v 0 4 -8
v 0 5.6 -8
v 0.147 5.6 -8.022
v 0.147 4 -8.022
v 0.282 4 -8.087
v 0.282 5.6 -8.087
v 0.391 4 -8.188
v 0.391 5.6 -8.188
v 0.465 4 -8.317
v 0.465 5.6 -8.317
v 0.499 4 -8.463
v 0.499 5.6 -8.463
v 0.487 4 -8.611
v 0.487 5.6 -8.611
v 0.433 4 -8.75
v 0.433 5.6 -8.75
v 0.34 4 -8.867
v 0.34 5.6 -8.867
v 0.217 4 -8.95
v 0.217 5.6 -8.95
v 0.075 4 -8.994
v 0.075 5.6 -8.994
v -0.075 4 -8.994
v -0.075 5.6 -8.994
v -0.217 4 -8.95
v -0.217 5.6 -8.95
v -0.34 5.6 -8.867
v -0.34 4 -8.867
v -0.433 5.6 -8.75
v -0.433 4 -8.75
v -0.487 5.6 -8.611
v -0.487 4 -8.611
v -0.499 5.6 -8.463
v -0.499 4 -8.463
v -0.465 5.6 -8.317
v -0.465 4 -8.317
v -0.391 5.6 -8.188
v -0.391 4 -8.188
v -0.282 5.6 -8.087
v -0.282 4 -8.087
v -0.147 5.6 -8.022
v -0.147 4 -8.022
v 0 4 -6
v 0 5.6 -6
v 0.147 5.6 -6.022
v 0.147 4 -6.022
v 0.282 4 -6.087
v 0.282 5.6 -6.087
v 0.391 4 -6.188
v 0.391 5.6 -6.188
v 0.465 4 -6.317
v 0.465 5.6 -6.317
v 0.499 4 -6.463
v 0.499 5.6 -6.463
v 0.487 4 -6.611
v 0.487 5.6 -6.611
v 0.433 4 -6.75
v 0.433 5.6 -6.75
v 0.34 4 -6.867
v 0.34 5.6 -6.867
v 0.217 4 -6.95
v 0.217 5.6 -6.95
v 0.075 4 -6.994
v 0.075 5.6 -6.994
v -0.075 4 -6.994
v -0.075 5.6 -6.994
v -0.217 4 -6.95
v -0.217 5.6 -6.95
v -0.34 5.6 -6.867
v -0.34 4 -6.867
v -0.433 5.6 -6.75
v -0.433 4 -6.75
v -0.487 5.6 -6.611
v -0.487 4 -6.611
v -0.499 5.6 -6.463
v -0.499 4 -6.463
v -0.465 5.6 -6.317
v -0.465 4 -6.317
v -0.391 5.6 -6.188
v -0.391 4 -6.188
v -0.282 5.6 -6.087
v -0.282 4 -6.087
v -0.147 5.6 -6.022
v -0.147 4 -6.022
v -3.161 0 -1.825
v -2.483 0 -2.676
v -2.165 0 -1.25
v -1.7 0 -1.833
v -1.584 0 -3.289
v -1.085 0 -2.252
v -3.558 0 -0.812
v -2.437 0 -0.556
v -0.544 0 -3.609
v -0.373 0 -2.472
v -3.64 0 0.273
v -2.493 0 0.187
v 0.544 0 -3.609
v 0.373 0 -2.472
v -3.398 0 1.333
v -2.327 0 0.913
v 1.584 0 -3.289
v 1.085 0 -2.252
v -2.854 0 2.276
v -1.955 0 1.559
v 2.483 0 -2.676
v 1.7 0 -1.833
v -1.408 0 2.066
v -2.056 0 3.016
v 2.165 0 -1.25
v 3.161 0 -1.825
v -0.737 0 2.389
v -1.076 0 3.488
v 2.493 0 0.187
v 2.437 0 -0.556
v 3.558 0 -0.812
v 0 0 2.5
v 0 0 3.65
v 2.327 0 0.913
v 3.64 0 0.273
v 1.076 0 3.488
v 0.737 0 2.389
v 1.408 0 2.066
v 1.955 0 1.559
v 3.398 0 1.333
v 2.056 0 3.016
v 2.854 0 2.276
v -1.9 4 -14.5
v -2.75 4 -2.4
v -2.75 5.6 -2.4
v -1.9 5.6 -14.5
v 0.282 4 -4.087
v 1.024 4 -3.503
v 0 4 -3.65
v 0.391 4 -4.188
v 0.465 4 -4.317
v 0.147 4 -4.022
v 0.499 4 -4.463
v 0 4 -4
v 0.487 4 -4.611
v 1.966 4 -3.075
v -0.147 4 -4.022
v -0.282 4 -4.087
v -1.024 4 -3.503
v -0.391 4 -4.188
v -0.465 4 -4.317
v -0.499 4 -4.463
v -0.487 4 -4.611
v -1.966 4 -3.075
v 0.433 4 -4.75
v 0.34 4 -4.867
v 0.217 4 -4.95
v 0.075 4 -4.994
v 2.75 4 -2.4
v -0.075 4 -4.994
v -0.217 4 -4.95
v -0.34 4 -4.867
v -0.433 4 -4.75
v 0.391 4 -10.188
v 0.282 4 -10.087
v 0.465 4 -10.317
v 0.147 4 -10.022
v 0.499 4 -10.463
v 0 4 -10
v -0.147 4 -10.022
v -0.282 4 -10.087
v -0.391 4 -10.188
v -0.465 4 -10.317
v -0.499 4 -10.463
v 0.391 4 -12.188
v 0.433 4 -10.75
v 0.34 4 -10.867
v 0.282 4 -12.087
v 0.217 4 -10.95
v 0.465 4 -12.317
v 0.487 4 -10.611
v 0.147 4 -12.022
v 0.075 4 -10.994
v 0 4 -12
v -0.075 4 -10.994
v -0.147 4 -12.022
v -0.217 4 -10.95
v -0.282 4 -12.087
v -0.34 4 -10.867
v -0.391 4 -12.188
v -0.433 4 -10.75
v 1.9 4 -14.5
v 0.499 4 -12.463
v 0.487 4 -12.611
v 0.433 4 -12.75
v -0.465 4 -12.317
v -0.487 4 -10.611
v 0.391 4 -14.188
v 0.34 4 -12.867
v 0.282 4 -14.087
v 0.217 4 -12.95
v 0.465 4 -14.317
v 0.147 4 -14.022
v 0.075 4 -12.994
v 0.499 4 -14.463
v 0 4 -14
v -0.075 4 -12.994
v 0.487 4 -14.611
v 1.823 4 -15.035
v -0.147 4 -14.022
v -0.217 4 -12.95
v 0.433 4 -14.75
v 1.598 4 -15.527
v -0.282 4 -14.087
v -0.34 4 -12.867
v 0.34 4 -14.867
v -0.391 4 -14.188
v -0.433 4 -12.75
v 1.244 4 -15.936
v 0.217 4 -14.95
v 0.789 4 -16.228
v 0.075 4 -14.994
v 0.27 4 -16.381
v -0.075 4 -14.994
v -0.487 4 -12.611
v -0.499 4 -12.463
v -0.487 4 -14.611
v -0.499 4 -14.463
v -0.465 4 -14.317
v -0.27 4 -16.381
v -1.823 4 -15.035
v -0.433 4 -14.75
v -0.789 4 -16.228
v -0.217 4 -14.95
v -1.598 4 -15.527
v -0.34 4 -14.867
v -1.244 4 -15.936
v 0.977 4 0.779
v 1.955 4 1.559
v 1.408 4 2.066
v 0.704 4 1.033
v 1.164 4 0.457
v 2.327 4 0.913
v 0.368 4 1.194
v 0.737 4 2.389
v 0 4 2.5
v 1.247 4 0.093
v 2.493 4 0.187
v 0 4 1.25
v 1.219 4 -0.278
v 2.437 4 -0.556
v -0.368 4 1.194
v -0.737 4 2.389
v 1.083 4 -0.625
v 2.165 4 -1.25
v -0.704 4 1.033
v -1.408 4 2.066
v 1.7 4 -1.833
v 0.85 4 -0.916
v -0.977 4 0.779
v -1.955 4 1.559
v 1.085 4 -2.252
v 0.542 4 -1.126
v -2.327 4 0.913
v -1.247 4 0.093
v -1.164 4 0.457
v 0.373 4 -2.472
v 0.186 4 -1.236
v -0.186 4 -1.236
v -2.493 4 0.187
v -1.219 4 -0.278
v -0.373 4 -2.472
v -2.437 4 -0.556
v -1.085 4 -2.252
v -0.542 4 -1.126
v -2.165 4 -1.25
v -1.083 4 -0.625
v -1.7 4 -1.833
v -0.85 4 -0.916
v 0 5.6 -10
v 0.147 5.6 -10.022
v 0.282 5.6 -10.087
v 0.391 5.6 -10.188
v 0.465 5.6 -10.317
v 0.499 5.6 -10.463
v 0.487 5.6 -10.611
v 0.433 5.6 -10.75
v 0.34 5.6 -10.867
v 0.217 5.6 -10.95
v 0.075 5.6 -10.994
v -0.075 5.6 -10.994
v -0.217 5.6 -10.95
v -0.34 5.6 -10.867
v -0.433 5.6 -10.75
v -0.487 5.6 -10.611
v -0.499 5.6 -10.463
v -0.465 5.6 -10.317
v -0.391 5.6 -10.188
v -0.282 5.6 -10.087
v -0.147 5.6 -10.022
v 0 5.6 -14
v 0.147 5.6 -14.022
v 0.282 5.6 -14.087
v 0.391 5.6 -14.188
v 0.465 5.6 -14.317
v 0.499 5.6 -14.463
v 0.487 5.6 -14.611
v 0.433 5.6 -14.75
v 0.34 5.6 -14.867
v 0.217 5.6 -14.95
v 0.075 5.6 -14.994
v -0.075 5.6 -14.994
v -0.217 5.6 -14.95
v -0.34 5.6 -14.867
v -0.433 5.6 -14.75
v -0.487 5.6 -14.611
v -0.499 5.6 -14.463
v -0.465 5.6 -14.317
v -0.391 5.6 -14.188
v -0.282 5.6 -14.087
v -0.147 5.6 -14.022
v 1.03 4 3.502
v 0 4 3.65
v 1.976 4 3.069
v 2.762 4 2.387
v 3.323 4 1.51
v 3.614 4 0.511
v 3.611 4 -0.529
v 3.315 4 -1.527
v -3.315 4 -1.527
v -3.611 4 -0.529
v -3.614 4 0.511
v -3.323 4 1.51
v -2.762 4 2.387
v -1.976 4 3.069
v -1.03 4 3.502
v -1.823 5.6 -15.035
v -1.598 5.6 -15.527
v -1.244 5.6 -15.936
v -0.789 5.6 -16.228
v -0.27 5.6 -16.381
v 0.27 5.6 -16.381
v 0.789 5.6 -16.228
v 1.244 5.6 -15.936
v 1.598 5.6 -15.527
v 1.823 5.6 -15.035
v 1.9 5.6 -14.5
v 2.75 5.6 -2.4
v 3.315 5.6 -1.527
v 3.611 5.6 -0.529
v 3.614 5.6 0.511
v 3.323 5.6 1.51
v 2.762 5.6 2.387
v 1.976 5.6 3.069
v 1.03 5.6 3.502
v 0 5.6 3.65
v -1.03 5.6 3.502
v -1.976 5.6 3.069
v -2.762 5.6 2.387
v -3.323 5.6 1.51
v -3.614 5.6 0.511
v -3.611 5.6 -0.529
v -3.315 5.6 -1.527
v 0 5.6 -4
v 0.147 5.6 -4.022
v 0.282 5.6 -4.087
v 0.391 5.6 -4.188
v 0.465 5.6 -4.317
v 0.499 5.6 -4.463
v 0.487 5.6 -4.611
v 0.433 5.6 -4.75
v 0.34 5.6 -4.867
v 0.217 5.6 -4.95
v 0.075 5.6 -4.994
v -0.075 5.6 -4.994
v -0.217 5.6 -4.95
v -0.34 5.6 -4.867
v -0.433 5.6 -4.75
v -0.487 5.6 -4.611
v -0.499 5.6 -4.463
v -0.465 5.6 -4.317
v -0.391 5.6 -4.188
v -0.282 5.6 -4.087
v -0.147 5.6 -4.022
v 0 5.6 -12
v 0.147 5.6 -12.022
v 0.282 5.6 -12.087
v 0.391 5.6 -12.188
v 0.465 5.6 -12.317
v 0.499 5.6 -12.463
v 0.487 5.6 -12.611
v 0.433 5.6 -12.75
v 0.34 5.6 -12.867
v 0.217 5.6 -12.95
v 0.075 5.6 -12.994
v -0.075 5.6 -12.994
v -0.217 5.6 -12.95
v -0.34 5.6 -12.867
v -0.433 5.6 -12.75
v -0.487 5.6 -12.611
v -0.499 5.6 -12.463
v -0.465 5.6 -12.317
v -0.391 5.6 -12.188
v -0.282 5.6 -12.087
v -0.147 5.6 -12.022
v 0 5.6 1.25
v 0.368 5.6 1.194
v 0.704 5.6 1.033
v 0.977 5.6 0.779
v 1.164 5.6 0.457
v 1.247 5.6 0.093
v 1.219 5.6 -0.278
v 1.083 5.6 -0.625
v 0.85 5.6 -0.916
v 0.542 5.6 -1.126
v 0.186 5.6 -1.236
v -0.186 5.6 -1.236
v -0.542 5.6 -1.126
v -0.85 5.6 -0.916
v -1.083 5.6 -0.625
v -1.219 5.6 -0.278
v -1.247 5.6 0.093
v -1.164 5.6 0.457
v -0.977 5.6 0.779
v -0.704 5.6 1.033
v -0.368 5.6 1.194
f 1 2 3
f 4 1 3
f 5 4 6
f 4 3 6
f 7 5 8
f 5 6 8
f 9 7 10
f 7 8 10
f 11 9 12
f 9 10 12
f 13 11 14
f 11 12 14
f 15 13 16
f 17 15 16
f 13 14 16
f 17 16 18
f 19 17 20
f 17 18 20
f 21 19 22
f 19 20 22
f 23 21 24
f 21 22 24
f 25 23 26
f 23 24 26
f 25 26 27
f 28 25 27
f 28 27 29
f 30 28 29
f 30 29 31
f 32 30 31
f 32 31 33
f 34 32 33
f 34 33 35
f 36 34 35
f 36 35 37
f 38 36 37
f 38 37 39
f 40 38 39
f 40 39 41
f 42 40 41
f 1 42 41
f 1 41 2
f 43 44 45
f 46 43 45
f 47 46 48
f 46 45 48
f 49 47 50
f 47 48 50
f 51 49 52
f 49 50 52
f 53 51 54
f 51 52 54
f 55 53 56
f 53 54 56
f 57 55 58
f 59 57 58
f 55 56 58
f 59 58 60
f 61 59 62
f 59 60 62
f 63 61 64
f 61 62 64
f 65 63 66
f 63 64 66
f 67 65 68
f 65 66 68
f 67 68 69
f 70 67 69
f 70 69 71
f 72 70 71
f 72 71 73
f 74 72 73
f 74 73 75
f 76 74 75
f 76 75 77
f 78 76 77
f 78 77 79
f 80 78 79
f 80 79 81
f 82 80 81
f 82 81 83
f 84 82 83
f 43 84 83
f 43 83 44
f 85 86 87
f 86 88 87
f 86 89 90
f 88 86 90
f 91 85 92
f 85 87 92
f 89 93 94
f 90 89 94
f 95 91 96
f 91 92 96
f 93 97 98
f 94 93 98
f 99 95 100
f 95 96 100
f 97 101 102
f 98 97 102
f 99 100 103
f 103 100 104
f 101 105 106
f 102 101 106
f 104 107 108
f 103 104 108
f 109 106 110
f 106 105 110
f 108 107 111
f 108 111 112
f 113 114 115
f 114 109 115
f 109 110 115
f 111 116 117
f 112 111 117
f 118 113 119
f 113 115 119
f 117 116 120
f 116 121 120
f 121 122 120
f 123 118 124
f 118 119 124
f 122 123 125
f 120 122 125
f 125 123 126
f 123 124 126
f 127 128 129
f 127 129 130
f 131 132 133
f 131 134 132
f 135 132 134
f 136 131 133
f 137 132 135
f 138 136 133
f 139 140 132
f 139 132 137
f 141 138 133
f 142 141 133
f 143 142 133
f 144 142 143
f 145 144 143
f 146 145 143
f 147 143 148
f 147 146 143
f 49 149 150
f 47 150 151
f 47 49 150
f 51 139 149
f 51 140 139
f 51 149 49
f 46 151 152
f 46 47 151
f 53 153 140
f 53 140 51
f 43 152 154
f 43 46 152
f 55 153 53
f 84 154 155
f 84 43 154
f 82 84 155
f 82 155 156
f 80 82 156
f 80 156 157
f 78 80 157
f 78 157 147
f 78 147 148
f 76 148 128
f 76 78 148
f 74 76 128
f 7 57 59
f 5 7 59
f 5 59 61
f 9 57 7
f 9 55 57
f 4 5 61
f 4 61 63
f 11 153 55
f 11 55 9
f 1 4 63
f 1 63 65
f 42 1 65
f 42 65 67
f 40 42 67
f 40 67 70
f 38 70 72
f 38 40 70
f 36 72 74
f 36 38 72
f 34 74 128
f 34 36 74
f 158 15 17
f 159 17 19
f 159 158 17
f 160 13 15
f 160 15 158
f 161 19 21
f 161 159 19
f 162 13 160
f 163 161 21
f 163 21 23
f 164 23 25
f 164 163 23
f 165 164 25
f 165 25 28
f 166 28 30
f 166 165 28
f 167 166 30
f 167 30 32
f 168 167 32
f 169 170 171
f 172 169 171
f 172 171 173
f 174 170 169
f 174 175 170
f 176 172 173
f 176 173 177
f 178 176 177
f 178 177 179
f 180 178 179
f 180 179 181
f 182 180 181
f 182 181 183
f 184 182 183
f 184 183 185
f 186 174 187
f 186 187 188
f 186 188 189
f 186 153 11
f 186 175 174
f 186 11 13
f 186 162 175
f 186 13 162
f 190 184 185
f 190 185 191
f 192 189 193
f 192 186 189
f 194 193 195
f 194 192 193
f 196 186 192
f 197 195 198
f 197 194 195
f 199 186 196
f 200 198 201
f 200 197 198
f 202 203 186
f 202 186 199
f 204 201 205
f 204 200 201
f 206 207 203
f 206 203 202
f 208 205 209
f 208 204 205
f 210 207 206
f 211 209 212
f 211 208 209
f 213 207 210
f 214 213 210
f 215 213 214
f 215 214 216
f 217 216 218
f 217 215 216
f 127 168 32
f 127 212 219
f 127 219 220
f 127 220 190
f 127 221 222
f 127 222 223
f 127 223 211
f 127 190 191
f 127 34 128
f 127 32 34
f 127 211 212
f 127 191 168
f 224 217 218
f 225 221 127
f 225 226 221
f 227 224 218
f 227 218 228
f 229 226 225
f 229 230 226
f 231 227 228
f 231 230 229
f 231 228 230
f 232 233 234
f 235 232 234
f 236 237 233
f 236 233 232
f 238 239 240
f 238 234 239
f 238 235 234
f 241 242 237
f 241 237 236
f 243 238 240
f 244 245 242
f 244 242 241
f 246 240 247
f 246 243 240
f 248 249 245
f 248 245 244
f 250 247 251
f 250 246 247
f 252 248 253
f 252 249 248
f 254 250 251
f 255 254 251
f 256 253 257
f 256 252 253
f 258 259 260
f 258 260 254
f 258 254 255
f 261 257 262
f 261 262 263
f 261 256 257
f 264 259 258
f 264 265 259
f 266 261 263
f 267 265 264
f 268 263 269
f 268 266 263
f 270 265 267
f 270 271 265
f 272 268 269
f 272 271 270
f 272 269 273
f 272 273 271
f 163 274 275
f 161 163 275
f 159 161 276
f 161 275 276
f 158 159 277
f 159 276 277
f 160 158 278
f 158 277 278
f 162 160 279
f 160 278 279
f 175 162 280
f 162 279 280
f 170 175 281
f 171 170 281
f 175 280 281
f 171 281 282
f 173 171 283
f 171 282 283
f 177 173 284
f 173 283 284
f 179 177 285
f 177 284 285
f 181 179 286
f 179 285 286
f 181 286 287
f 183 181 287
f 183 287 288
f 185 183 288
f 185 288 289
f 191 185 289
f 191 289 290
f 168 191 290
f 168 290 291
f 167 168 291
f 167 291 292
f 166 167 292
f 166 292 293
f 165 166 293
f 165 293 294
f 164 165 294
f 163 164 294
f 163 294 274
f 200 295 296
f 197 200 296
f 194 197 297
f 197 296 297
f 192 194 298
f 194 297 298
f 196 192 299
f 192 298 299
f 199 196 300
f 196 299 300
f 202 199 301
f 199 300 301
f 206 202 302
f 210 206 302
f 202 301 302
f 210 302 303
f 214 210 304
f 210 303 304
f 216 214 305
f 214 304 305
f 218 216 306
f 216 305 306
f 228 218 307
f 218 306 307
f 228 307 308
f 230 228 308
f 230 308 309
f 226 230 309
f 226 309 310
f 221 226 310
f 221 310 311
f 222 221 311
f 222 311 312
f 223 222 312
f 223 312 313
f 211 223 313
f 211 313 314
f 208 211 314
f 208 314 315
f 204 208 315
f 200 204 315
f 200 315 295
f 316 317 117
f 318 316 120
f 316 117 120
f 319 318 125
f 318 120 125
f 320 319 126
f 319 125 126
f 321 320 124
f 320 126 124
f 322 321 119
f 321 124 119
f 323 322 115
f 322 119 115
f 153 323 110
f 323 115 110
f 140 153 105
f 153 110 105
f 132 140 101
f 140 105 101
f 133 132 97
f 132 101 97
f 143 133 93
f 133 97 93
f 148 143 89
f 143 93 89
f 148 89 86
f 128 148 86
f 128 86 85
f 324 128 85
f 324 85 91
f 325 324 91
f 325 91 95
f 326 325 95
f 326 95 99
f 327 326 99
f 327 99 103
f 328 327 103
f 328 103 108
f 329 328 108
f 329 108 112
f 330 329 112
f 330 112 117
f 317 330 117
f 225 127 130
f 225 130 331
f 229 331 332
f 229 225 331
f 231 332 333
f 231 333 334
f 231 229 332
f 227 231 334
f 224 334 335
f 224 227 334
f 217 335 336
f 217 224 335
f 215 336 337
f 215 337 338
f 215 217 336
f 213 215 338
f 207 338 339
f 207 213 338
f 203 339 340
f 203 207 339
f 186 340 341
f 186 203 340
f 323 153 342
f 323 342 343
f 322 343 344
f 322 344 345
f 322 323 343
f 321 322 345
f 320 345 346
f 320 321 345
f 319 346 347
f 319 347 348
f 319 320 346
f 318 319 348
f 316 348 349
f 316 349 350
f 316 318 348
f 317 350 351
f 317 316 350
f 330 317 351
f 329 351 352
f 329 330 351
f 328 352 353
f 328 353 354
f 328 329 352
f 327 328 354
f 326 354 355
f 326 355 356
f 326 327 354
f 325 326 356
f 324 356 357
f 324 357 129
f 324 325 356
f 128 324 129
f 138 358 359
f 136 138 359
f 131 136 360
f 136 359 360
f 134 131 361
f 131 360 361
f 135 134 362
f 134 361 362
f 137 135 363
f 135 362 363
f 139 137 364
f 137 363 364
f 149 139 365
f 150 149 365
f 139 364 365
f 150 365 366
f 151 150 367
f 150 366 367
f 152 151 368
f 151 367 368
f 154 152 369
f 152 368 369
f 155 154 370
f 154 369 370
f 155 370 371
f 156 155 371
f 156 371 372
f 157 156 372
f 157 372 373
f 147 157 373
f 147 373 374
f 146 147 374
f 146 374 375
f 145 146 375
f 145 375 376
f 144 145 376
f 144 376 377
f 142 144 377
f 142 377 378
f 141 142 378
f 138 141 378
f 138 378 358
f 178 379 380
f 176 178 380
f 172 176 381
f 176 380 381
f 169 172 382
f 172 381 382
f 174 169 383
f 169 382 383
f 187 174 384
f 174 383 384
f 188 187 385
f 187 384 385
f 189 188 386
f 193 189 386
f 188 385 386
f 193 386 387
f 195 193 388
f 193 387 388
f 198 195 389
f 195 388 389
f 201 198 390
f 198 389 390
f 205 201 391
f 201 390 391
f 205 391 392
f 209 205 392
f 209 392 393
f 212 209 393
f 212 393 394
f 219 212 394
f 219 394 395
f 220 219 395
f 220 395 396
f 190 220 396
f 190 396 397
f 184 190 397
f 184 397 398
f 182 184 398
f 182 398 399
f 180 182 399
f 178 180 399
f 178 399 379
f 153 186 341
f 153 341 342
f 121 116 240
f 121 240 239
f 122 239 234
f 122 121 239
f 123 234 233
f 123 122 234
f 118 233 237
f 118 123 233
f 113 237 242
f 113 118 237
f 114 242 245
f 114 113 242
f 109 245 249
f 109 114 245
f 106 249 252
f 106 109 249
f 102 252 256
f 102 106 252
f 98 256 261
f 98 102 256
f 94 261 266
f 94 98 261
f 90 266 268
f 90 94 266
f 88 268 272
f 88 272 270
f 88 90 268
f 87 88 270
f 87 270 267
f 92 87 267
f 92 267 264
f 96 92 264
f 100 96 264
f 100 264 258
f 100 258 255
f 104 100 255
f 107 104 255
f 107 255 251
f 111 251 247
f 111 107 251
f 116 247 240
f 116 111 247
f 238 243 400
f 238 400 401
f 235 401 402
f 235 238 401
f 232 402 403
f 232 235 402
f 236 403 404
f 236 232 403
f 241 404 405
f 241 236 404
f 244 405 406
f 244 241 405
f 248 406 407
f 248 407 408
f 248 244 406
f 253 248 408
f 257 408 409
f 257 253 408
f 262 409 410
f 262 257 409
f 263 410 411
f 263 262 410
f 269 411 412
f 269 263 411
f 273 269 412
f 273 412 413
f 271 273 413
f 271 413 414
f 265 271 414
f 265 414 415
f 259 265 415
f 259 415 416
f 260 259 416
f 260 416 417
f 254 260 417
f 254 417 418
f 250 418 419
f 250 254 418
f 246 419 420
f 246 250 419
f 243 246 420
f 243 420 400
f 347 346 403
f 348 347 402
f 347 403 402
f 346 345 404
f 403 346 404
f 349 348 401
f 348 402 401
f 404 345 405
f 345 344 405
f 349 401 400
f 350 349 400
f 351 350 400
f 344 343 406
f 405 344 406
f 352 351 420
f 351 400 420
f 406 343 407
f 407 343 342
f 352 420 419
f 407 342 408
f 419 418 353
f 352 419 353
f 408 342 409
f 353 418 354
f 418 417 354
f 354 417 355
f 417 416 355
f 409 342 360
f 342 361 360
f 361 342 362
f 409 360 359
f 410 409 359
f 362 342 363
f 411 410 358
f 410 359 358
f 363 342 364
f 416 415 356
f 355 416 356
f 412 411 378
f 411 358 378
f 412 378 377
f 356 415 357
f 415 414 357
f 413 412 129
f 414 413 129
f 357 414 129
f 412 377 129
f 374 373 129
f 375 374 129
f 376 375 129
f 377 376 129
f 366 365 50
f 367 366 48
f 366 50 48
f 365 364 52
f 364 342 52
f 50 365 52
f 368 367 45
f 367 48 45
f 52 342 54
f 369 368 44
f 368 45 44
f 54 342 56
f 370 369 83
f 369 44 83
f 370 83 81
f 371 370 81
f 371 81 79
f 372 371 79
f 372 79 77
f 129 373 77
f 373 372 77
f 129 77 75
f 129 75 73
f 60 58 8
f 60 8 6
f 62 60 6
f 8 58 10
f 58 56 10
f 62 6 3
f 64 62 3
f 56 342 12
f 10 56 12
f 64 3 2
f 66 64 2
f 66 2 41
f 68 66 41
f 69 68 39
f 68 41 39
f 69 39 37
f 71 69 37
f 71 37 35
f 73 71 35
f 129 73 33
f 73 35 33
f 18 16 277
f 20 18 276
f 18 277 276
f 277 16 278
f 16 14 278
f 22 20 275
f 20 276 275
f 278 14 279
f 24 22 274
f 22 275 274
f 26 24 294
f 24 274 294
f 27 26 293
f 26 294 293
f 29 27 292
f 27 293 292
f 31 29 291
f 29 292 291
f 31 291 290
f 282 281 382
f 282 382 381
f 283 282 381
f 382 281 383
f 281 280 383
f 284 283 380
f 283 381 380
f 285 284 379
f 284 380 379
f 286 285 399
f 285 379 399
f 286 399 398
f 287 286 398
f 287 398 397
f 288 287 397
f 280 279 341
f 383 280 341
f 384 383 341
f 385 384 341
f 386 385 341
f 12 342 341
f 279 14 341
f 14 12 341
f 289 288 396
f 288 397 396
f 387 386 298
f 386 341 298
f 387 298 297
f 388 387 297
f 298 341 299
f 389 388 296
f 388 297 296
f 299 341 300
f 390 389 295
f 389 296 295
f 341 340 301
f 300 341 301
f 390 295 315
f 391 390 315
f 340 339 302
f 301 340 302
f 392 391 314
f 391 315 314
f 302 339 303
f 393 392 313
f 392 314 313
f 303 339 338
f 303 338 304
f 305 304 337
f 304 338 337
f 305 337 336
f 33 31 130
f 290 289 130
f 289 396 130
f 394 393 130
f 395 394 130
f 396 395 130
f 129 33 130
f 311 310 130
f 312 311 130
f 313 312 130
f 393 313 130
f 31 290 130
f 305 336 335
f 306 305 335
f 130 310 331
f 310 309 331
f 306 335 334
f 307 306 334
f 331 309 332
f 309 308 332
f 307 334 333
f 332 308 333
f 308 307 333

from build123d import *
from build123d.topology import SkipClean

# Parameters (mm, degrees)
SKETCH1_R           = 3.65
SKETCH1_R_2         = 2.5
BOSS_EXTRUDE1_DEPTH = 4
SKETCH2_R           = 1.25
BOSS_EXTRUDE2_DEPTH = 1.6
CUT_EXTRUDE1_REACH  = 19.71
SKETCH3_R           = 0.5


with BuildPart() as part:
    # Sketch1 → Boss-Extrude1 (new body)
    with BuildSketch(Plane(origin=(0, 0, 0), x_dir=(1, 0, 0), z_dir=(0, 1, 0))):
        Circle(SKETCH1_R)
        Circle(SKETCH1_R_2, mode=Mode.SUBTRACT)
    extrude(amount=BOSS_EXTRUDE1_DEPTH)

    # Sketch2 → Boss-Extrude2 (add)
    with SkipClean():  # the faces are left unmerged after this step: merging them gives an invalid solid
        with BuildSketch(Plane(origin=(0, 4, 0), x_dir=(1, 0, 0), z_dir=(0, 1, 0))):
            with BuildLine():
                Line((-2.75, 2.4), (-1.9, 14.5))
                ThreePointArc((-1.9, 14.5), (0, 16.4), (1.9, 14.5))
                Line((1.9, 14.5), (2.75, 2.4))
                ThreePointArc((2.75, 2.4), (0, -3.65), (-2.75, 2.4))
            make_face()
            Circle(SKETCH2_R, mode=Mode.SUBTRACT)
        extrude(amount=BOSS_EXTRUDE2_DEPTH)
    add(part.part.scale(1), mode=Mode.REPLACE)  # the faces are merged on a copy

    # Sketch3 → Cut-Extrude1 (cut, up to next)
    with BuildSketch(Plane(origin=(0, 5.6, 0), x_dir=(1, 0, 0), z_dir=(0, 1, 0)), mode=Mode.PRIVATE) as cut_extrude1_sk1:
        with Locations((0, 12.5)):
            Circle(SKETCH3_R)
    cut_extrude1_tool1 = extrude(cut_extrude1_sk1.sketch, amount=-CUT_EXTRUDE1_REACH, mode=Mode.PRIVATE) & part.part
    # Sketch3 → Cut-Extrude1 (cut, up to next)
    with BuildSketch(Plane(origin=(0, 5.6, 0), x_dir=(1, 0, 0), z_dir=(0, 1, 0)), mode=Mode.PRIVATE) as cut_extrude1_sk2:
        with Locations((0, 10.5)):
            Circle(SKETCH3_R)
    cut_extrude1_tool2 = extrude(cut_extrude1_sk2.sketch, amount=-CUT_EXTRUDE1_REACH, mode=Mode.PRIVATE) & part.part
    # Sketch3 → Cut-Extrude1 (cut, up to next)
    with BuildSketch(Plane(origin=(0, 5.6, 0), x_dir=(1, 0, 0), z_dir=(0, 1, 0)), mode=Mode.PRIVATE) as cut_extrude1_sk3:
        with Locations((0, 14.5)):
            Circle(SKETCH3_R)
    cut_extrude1_tool3 = extrude(cut_extrude1_sk3.sketch, amount=-CUT_EXTRUDE1_REACH, mode=Mode.PRIVATE) & part.part
    # Sketch3 → Cut-Extrude1 (cut, up to next)
    with BuildSketch(Plane(origin=(0, 5.6, 0), x_dir=(1, 0, 0), z_dir=(0, 1, 0)), mode=Mode.PRIVATE) as cut_extrude1_sk4:
        with Locations((0, 8.5)):
            Circle(SKETCH3_R)
    cut_extrude1_tool4 = extrude(cut_extrude1_sk4.sketch, amount=-CUT_EXTRUDE1_REACH, mode=Mode.PRIVATE) & part.part
    # Sketch3 → Cut-Extrude1 (cut, up to next)
    with BuildSketch(Plane(origin=(0, 5.6, 0), x_dir=(1, 0, 0), z_dir=(0, 1, 0)), mode=Mode.PRIVATE) as cut_extrude1_sk5:
        with Locations((0, 6.5)):
            Circle(SKETCH3_R)
    cut_extrude1_tool5 = extrude(cut_extrude1_sk5.sketch, amount=-CUT_EXTRUDE1_REACH, mode=Mode.PRIVATE) & part.part
    # Sketch3 → Cut-Extrude1 (cut, up to next)
    with BuildSketch(Plane(origin=(0, 5.6, 0), x_dir=(1, 0, 0), z_dir=(0, 1, 0)), mode=Mode.PRIVATE) as cut_extrude1_sk6:
        with Locations((0, 4.5)):
            Circle(SKETCH3_R)
    cut_extrude1_tool6 = extrude(cut_extrude1_sk6.sketch, amount=-CUT_EXTRUDE1_REACH, mode=Mode.PRIVATE) & part.part
    add(cut_extrude1_tool1.solids().sort_by_distance((0, 5.6, -12.5))[0], mode=Mode.SUBTRACT)
    add(cut_extrude1_tool2.solids().sort_by_distance((0, 5.6, -10.5))[0], mode=Mode.SUBTRACT)
    add(cut_extrude1_tool3.solids().sort_by_distance((0, 5.6, -14.5))[0], mode=Mode.SUBTRACT)
    add(cut_extrude1_tool4.solids().sort_by_distance((0, 5.6, -8.5))[0], mode=Mode.SUBTRACT)
    add(cut_extrude1_tool5.solids().sort_by_distance((0, 5.6, -6.5))[0], mode=Mode.SUBTRACT)
    add(cut_extrude1_tool6.solids().sort_by_distance((0, 5.6, -4.5))[0], mode=Mode.SUBTRACT)


solid = part.part
